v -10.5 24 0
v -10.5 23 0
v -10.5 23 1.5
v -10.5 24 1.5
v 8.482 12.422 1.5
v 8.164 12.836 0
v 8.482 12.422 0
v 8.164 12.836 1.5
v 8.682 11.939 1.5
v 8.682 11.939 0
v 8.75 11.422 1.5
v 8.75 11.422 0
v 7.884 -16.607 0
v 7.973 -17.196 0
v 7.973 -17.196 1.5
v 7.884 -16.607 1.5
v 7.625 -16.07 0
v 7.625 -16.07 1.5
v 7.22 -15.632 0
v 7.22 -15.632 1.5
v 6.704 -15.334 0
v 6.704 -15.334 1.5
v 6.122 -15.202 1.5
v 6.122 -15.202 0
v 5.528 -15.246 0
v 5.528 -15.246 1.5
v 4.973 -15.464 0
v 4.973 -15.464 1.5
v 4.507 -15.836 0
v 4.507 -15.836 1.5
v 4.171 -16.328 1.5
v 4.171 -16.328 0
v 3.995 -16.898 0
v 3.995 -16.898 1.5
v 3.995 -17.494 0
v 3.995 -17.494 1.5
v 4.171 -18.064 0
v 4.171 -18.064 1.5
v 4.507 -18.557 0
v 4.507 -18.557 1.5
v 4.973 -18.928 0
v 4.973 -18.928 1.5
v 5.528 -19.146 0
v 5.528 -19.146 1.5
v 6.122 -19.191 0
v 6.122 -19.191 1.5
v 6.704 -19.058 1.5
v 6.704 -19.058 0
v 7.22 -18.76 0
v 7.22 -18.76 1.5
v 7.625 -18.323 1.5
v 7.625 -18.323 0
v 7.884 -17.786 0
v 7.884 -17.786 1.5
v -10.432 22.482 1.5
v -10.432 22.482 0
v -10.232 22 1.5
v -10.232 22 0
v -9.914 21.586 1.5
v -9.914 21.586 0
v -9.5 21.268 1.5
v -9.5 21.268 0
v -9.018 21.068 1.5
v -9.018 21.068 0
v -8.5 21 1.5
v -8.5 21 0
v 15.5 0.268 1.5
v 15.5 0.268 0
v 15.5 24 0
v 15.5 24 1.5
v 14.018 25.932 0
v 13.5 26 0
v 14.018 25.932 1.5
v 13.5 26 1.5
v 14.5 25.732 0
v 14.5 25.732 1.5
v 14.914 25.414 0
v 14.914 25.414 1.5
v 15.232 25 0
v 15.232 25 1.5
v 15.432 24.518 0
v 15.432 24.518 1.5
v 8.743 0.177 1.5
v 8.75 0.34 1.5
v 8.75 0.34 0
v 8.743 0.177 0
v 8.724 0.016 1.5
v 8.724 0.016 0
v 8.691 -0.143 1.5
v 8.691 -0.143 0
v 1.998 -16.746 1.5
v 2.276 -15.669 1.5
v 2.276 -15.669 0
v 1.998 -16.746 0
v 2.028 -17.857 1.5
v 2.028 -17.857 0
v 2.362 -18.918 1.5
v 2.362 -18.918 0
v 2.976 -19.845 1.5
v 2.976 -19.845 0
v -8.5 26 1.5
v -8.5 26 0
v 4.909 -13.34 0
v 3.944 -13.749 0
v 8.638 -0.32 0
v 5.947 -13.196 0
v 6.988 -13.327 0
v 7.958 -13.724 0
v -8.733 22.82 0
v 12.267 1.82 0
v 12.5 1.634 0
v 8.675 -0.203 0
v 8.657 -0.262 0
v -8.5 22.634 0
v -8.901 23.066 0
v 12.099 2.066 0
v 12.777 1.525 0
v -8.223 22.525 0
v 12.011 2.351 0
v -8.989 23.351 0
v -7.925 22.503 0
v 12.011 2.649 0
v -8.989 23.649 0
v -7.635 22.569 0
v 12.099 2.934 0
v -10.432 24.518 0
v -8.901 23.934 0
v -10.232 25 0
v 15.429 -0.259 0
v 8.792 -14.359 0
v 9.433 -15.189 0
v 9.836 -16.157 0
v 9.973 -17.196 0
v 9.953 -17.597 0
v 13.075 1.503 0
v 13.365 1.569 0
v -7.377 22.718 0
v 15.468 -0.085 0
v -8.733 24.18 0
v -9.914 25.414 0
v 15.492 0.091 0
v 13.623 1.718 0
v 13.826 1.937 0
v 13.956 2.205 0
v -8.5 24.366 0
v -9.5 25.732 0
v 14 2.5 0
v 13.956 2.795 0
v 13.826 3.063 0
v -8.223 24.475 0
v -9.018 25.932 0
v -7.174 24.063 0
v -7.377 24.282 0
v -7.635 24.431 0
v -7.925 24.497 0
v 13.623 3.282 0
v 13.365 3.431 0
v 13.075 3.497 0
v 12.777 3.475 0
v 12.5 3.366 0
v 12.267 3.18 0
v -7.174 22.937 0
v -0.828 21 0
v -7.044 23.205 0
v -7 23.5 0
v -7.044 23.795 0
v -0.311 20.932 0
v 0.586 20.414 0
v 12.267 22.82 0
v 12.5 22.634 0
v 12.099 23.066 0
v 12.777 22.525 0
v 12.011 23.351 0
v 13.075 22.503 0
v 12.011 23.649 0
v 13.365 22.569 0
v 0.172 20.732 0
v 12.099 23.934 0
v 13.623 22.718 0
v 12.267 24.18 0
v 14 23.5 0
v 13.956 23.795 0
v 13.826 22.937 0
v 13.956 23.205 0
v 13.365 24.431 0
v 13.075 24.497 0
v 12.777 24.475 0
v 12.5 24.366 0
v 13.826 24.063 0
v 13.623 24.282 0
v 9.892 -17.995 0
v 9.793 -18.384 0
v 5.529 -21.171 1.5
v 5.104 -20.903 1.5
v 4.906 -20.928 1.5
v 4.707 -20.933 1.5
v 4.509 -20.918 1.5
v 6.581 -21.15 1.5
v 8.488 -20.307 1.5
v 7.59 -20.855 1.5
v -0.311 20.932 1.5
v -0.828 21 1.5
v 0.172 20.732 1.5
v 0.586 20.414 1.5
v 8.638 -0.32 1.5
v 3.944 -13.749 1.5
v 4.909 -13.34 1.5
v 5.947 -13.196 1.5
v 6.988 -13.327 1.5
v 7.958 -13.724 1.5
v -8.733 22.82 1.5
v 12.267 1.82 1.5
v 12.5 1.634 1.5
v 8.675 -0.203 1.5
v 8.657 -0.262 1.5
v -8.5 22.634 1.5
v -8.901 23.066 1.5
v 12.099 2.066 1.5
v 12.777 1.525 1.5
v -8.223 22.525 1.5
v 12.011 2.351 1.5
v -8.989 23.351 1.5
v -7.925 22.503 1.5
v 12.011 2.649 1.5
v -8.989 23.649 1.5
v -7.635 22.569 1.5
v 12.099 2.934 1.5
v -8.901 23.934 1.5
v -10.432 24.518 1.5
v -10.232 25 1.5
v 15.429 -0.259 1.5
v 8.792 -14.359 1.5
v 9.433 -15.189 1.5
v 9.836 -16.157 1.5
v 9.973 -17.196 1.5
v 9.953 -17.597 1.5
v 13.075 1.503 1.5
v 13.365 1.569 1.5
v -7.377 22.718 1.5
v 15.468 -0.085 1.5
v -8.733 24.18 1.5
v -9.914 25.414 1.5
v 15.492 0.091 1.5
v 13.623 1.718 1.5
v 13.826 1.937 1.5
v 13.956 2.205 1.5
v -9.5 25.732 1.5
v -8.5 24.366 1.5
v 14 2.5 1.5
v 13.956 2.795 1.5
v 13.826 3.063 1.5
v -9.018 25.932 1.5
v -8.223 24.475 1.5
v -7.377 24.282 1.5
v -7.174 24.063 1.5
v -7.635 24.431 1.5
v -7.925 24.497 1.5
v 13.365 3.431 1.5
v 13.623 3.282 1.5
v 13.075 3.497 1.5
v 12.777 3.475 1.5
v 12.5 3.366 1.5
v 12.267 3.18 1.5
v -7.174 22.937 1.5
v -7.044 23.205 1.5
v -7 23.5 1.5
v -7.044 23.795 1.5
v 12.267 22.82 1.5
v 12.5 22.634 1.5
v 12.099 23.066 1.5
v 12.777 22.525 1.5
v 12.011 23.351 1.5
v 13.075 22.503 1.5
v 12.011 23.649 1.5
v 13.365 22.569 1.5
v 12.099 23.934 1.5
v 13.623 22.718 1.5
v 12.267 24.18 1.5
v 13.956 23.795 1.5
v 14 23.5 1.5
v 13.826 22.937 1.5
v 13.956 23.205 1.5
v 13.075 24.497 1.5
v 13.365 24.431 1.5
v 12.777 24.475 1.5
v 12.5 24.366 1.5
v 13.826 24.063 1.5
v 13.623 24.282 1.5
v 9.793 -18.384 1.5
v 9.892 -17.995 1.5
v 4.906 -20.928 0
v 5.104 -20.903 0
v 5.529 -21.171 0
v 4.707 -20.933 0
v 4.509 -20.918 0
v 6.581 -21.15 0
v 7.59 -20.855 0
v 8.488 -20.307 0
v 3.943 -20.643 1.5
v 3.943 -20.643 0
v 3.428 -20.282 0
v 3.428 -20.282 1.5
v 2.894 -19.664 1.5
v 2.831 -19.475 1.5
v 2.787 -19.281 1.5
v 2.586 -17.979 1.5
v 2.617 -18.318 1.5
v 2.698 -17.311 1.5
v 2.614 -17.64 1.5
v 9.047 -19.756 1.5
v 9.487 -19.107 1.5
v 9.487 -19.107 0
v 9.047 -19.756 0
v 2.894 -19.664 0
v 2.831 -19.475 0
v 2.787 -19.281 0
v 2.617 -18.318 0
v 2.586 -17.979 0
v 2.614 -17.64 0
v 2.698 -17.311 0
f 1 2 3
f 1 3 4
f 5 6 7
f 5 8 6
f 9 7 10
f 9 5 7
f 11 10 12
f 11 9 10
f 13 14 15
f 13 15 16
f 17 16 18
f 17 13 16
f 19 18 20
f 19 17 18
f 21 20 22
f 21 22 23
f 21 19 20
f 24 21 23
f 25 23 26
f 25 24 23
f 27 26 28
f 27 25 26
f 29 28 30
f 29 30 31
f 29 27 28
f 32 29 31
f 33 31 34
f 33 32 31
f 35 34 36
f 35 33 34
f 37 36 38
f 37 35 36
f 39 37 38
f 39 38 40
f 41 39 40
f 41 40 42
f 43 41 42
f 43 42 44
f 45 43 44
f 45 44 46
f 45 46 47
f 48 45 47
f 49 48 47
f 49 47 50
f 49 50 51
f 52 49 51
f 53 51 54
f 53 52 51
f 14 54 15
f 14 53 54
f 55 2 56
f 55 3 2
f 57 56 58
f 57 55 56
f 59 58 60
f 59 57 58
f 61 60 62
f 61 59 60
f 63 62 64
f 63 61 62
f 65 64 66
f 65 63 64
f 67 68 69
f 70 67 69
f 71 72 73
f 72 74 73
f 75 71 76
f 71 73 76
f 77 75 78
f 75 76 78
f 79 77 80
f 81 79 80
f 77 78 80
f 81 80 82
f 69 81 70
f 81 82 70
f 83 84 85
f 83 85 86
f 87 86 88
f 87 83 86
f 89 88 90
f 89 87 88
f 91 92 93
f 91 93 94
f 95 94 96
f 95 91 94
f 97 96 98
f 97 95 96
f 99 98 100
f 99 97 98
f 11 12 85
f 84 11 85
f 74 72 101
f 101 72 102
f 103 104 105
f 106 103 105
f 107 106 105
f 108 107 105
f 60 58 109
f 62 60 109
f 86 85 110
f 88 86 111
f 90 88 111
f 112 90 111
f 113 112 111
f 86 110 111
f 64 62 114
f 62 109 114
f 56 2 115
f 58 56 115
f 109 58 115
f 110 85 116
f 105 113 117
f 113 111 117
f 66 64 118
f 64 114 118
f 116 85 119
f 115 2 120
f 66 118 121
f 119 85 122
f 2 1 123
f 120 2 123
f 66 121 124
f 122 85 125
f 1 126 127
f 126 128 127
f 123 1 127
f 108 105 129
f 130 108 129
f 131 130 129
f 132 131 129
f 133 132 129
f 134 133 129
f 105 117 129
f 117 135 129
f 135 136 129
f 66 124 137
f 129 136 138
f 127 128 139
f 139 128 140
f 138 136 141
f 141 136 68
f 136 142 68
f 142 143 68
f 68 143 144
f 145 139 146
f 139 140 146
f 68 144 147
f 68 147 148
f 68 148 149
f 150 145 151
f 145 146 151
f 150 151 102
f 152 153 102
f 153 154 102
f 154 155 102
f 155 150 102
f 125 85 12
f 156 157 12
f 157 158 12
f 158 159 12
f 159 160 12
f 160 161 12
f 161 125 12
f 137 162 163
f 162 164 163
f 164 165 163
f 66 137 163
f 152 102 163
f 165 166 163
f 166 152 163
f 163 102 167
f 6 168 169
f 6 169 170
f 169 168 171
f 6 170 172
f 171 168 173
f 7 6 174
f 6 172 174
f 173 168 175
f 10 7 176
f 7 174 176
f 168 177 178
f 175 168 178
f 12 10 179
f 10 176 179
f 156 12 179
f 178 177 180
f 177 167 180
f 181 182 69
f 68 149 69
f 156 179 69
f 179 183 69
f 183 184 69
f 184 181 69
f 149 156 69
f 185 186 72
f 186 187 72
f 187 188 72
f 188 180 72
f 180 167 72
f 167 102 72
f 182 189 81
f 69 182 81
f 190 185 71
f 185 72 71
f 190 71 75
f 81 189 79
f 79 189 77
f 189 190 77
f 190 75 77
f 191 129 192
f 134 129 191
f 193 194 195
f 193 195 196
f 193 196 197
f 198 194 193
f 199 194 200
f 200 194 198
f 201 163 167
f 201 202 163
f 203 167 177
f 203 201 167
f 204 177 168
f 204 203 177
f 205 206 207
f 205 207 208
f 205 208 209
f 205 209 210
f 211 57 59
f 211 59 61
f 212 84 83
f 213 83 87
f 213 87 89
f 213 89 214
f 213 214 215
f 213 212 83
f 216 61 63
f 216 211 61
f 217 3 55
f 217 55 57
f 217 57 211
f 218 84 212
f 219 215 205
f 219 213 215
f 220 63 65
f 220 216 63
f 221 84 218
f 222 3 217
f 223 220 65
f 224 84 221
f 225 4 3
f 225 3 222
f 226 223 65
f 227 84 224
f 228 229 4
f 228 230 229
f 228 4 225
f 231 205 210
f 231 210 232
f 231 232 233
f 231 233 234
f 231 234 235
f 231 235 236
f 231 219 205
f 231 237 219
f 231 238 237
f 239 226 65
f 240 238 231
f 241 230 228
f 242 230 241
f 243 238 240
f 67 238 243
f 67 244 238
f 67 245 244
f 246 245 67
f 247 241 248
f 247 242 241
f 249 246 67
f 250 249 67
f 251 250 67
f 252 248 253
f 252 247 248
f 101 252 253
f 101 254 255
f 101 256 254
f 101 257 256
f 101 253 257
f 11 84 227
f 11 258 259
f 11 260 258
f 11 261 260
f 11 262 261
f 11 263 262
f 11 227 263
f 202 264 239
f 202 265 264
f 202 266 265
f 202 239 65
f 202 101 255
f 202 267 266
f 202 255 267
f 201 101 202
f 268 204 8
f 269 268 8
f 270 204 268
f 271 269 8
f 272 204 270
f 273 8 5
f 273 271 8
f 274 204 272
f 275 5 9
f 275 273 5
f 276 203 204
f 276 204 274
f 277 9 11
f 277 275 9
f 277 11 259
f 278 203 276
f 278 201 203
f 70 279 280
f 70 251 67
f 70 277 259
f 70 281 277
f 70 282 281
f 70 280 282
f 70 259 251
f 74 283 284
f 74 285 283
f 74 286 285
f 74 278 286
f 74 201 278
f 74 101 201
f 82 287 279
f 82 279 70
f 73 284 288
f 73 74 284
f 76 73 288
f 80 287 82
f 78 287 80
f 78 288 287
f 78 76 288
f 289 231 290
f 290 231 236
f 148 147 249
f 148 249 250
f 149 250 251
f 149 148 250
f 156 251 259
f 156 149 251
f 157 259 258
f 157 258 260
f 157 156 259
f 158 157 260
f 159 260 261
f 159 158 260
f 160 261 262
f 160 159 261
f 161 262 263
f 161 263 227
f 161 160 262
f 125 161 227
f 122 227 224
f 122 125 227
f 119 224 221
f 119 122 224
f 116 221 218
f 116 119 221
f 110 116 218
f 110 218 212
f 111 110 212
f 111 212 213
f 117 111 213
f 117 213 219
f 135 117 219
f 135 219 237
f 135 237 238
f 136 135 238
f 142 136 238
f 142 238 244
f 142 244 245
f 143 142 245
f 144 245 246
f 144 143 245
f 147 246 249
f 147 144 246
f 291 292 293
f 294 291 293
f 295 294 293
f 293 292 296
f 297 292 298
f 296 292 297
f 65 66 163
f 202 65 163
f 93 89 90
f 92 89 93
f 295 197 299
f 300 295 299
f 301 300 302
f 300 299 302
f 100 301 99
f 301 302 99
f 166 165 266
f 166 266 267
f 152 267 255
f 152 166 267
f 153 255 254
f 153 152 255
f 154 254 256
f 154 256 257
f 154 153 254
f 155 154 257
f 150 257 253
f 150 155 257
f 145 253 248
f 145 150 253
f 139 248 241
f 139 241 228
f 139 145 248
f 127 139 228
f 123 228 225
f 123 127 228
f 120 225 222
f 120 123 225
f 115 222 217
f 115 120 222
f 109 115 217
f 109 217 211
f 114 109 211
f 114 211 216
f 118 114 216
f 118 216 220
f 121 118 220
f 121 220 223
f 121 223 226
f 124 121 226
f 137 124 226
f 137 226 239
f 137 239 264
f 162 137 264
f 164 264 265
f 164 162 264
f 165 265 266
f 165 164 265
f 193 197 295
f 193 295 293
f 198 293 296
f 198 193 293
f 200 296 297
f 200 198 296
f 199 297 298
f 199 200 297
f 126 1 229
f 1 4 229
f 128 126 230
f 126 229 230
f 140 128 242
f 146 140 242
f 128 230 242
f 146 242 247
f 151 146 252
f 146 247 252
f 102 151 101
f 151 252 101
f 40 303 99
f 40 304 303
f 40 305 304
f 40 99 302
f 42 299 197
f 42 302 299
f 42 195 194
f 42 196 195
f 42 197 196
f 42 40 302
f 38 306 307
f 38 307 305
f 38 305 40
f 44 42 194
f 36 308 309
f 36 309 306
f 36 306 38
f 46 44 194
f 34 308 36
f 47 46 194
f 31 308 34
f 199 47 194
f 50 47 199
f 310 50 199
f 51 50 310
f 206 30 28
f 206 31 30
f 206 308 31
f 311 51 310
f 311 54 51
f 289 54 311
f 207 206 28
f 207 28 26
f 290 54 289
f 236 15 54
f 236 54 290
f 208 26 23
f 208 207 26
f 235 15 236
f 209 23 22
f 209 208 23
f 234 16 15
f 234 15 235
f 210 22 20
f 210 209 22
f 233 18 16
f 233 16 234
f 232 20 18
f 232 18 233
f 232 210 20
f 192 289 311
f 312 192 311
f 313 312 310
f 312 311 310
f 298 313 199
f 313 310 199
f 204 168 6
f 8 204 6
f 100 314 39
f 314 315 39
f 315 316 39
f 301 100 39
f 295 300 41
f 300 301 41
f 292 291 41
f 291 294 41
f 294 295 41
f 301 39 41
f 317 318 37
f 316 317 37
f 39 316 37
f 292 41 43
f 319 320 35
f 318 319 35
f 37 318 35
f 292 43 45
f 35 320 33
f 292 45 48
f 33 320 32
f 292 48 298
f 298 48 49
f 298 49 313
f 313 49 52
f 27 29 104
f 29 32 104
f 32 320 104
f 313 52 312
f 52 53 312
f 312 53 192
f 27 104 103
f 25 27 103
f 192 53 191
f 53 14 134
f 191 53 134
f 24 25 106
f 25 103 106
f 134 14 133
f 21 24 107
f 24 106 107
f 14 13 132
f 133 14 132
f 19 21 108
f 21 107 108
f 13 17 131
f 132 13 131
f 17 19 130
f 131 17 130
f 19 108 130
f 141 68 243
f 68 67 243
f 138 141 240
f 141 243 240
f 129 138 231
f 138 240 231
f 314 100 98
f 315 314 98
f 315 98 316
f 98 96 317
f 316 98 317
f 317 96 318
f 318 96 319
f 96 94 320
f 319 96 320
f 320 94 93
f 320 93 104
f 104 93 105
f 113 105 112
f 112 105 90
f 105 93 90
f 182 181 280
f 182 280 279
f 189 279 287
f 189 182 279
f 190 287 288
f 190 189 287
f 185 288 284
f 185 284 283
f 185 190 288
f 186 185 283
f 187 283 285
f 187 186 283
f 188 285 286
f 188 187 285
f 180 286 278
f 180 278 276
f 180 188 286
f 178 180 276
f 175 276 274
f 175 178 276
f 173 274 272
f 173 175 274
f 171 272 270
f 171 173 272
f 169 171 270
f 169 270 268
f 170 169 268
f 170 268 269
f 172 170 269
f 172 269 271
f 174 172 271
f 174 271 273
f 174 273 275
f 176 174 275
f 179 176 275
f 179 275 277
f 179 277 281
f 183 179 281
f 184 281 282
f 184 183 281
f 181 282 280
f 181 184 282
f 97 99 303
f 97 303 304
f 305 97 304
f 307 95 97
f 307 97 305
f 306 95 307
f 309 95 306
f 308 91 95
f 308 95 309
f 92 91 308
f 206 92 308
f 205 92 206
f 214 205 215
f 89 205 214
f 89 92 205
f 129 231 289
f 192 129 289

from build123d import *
from build123d import SkipClean  # not in build123d's __all__

# Parameters (mm, degrees)
F0_W     = 10.5
F0_H     = 5
F0_R     = 1
F0_R_2   = 2
F1_DEPTH = 1.5
F2_R     = 2
F4_DEPTH = 1.5
F3_R     = 1
F5_DEPTH = 1.5


with BuildPart() as f1:
    # F0 (on Top) → F1 (new body)
    with BuildSketch(Plane.XY):
        with Locations((-5.25, 23.5)):
            Rectangle(F0_W, F0_H)
        with Locations((-8, 23.5)):
            Circle(F0_R, mode=Mode.SUBTRACT)
        Polygon((8.75, 21), (0, 21), (8.75, 12.25), align=None)
        Polygon((8.75, 2.5), (8.75, 0), (15.5, 0), (15.5, 26), (0, 26), (0, 21), (8.75, 21), (8.75, 12.25), align=None)
        with Locations((13, 2.5)):
            Circle(F0_R, mode=Mode.SUBTRACT)
        with Locations((13, 23.5)):
            Circle(F0_R, mode=Mode.SUBTRACT)
        Polygon((15.5, 0), (8.75, 0), (2.5261364178, -17.8039236821), (3.1339050396, -21.2507508176), (10.0275593107, -20.035213574), align=None)
        with Locations((5.9729635533, -17.1961550602)):
            Circle(F0_R_2, mode=Mode.SUBTRACT)
    extrude(amount=F1_DEPTH)

    # F2
    f2_edges = [f1.edges().sort_by_distance(p)[0] for p in [
        (3.133905, -21.250751, 0.75),
        (2.526136, -17.803924, 0.75),
        (10.027559, -20.035214, 0.75),
        (0, 21, 0.75),
        (8.75, 12.25, 0.75),
        (8.75, 0, 0.75),
        (15.5, 0, 0.75),
        (-10.5, 21, 0.75),
        (-10.5, 26, 0.75),
        (15.5, 26, 0.75),
    ]]
    fillet(f2_edges, radius=F2_R)

    # F3 (on face) → F4 (cut, through all)
    with BuildSketch(Plane.XY.offset(1.5)):
        with BuildLine():
            Line((15.4293248166, -0.2587497013), (9.7925199679, -18.3840055542))
            ThreePointArc((9.7925199679, -18.3840055542), (9.2828500145, -19.4421852503), (8.4878041885, -20.3067139457))
            Line((8.4878041885, -20.3067139457), (8.7794635144, -20.2552865373))
            ThreePointArc((8.7794635144, -20.2552865373), (9.7797768114, -19.7634897702), (10.3614919757, -18.8126489739))
            Line((10.3614919757, -18.8126489739), (15.4293248166, -0.2587497013))
        make_face()
        with BuildLine():
            ThreePointArc((2.9760281468, -19.8453772421), (3.6090713176, -20.5721430448), (4.5085212955, -20.9184404971))
            ThreePointArc((4.5085212955, -20.9184404971), (3.6786578079, -20.4727632374), (2.9760281468, -19.8453772421))
        make_face()
    extrude(amount=-F4_DEPTH, mode=Mode.SUBTRACT)

    # F3 (on face) → F5 (join)
    with BuildSketch(Plane.XY.offset(1.5)):
        with BuildLine():
            ThreePointArc((2.2760890833, -15.6686999373), (2.9532568393, -14.5729182502), (3.9435858611, -13.7491815787))
            Line((3.9435858611, -13.7491815787), (8.6379648829, -0.3204865672))
            ThreePointArc((8.6379648829, -0.3204865672), (8.6665084457, -0.2323302993), (8.6909380974, -0.1429465499))
            Line((8.6909380974, -0.1429465499), (2.2760890833, -15.6686999373))
        make_face()
        with BuildLine():
            Line((2.6984727346, -17.3109400888), (3.9435858611, -13.7491815787))
            ThreePointArc((3.9435858611, -13.7491815787), (2.9532568393, -14.5729182502), (2.2760890833, -15.6686999373))
            ThreePointArc((2.2760890833, -15.6686999373), (2.027975468, -17.8572670075), (2.9760281468, -19.8453772421))
            ThreePointArc((2.9760281468, -19.8453772421), (2.8602115576, -19.570341978), (2.7866086843, -19.2811353116))
            Line((2.7866086843, -19.2811353116), (2.6168221115, -18.3182278083))
            ThreePointArc((2.6168221115, -18.3182278083), (2.5929761176, -17.8093417002), (2.6984727346, -17.3109400888))
        make_face()
        with BuildLine():
            ThreePointArc((4.5085212955, -20.9184404971), (6.5807353289, -21.1497121256), (8.4878041885, -20.3067139457))
            Line((8.4878041885, -20.3067139457), (5.1035205457, -20.9034544623))
            ThreePointArc((5.1035205457, -20.9034544623), (4.8065815101, -20.9332048908), (4.5085212955, -20.9184404971))
        make_face()
        with BuildLine():
            ThreePointArc((9.9729635533, -17.1961550602), (9.927595373, -17.7968939144), (9.7925199679, -18.3840055542))
            Line((9.7925199679, -18.3840055542), (15.4293248166, -0.2587497013))
            ThreePointArc((15.4293248166, -0.2587497013), (15.4822524604, 0.0023801957), (15.5, 0.2682282413))
            Line((15.5, 0.2682282413), (15.5, 24))
            ThreePointArc((15.5, 24), (14.9142135624, 25.4142135624), (13.5, 26))
            Line((13.5, 26), (-8.5, 26))
            ThreePointArc((-8.5, 26), (-9.9142135624, 25.4142135624), (-10.5, 24))
            Line((-10.5, 24), (-10.5, 23))
            ThreePointArc((-10.5, 23), (-9.9142135624, 21.5857864376), (-8.5, 21))
            Line((-8.5, 21), (-0.8284271247, 21))
            ThreePointArc((-0.8284271247, 21), (-0.06306026, 20.847759065), (0.5857864376, 20.4142135624))
            Line((0.5857864376, 20.4142135624), (8.1642135624, 12.8357864376))
            ThreePointArc((8.1642135624, 12.8357864376), (8.597759065, 12.18693974), (8.75, 11.4215728753))
            Line((8.75, 11.4215728753), (8.75, 0.339504797))
            ThreePointArc((8.75, 0.339504797), (8.7351796134, 0.0964782499), (8.6909380974, -0.1429465499))
            ThreePointArc((8.6909380974, -0.1429465499), (8.6665084457, -0.2323302993), (8.6379648829, -0.3204865672))
            Line((8.6379648829, -0.3204865672), (3.9435858611, -13.7491815787))
            ThreePointArc((3.9435858611, -13.7491815787), (7.9582203668, -13.7235831914), (9.9729635533, -17.1961550602))
        make_face()
        with Locations((-8, 23.5)):
            Circle(F3_R, mode=Mode.SUBTRACT)
        with Locations((13, 2.5)):
            Circle(F3_R, mode=Mode.SUBTRACT)
        with Locations((13, 23.5)):
            Circle(F3_R, mode=Mode.SUBTRACT)
    with SkipClean():  # cleaning this boolean's faces spoils the solid; the shape is the same uncleaned
        extrude(amount=-F5_DEPTH)


solid = f1.part
